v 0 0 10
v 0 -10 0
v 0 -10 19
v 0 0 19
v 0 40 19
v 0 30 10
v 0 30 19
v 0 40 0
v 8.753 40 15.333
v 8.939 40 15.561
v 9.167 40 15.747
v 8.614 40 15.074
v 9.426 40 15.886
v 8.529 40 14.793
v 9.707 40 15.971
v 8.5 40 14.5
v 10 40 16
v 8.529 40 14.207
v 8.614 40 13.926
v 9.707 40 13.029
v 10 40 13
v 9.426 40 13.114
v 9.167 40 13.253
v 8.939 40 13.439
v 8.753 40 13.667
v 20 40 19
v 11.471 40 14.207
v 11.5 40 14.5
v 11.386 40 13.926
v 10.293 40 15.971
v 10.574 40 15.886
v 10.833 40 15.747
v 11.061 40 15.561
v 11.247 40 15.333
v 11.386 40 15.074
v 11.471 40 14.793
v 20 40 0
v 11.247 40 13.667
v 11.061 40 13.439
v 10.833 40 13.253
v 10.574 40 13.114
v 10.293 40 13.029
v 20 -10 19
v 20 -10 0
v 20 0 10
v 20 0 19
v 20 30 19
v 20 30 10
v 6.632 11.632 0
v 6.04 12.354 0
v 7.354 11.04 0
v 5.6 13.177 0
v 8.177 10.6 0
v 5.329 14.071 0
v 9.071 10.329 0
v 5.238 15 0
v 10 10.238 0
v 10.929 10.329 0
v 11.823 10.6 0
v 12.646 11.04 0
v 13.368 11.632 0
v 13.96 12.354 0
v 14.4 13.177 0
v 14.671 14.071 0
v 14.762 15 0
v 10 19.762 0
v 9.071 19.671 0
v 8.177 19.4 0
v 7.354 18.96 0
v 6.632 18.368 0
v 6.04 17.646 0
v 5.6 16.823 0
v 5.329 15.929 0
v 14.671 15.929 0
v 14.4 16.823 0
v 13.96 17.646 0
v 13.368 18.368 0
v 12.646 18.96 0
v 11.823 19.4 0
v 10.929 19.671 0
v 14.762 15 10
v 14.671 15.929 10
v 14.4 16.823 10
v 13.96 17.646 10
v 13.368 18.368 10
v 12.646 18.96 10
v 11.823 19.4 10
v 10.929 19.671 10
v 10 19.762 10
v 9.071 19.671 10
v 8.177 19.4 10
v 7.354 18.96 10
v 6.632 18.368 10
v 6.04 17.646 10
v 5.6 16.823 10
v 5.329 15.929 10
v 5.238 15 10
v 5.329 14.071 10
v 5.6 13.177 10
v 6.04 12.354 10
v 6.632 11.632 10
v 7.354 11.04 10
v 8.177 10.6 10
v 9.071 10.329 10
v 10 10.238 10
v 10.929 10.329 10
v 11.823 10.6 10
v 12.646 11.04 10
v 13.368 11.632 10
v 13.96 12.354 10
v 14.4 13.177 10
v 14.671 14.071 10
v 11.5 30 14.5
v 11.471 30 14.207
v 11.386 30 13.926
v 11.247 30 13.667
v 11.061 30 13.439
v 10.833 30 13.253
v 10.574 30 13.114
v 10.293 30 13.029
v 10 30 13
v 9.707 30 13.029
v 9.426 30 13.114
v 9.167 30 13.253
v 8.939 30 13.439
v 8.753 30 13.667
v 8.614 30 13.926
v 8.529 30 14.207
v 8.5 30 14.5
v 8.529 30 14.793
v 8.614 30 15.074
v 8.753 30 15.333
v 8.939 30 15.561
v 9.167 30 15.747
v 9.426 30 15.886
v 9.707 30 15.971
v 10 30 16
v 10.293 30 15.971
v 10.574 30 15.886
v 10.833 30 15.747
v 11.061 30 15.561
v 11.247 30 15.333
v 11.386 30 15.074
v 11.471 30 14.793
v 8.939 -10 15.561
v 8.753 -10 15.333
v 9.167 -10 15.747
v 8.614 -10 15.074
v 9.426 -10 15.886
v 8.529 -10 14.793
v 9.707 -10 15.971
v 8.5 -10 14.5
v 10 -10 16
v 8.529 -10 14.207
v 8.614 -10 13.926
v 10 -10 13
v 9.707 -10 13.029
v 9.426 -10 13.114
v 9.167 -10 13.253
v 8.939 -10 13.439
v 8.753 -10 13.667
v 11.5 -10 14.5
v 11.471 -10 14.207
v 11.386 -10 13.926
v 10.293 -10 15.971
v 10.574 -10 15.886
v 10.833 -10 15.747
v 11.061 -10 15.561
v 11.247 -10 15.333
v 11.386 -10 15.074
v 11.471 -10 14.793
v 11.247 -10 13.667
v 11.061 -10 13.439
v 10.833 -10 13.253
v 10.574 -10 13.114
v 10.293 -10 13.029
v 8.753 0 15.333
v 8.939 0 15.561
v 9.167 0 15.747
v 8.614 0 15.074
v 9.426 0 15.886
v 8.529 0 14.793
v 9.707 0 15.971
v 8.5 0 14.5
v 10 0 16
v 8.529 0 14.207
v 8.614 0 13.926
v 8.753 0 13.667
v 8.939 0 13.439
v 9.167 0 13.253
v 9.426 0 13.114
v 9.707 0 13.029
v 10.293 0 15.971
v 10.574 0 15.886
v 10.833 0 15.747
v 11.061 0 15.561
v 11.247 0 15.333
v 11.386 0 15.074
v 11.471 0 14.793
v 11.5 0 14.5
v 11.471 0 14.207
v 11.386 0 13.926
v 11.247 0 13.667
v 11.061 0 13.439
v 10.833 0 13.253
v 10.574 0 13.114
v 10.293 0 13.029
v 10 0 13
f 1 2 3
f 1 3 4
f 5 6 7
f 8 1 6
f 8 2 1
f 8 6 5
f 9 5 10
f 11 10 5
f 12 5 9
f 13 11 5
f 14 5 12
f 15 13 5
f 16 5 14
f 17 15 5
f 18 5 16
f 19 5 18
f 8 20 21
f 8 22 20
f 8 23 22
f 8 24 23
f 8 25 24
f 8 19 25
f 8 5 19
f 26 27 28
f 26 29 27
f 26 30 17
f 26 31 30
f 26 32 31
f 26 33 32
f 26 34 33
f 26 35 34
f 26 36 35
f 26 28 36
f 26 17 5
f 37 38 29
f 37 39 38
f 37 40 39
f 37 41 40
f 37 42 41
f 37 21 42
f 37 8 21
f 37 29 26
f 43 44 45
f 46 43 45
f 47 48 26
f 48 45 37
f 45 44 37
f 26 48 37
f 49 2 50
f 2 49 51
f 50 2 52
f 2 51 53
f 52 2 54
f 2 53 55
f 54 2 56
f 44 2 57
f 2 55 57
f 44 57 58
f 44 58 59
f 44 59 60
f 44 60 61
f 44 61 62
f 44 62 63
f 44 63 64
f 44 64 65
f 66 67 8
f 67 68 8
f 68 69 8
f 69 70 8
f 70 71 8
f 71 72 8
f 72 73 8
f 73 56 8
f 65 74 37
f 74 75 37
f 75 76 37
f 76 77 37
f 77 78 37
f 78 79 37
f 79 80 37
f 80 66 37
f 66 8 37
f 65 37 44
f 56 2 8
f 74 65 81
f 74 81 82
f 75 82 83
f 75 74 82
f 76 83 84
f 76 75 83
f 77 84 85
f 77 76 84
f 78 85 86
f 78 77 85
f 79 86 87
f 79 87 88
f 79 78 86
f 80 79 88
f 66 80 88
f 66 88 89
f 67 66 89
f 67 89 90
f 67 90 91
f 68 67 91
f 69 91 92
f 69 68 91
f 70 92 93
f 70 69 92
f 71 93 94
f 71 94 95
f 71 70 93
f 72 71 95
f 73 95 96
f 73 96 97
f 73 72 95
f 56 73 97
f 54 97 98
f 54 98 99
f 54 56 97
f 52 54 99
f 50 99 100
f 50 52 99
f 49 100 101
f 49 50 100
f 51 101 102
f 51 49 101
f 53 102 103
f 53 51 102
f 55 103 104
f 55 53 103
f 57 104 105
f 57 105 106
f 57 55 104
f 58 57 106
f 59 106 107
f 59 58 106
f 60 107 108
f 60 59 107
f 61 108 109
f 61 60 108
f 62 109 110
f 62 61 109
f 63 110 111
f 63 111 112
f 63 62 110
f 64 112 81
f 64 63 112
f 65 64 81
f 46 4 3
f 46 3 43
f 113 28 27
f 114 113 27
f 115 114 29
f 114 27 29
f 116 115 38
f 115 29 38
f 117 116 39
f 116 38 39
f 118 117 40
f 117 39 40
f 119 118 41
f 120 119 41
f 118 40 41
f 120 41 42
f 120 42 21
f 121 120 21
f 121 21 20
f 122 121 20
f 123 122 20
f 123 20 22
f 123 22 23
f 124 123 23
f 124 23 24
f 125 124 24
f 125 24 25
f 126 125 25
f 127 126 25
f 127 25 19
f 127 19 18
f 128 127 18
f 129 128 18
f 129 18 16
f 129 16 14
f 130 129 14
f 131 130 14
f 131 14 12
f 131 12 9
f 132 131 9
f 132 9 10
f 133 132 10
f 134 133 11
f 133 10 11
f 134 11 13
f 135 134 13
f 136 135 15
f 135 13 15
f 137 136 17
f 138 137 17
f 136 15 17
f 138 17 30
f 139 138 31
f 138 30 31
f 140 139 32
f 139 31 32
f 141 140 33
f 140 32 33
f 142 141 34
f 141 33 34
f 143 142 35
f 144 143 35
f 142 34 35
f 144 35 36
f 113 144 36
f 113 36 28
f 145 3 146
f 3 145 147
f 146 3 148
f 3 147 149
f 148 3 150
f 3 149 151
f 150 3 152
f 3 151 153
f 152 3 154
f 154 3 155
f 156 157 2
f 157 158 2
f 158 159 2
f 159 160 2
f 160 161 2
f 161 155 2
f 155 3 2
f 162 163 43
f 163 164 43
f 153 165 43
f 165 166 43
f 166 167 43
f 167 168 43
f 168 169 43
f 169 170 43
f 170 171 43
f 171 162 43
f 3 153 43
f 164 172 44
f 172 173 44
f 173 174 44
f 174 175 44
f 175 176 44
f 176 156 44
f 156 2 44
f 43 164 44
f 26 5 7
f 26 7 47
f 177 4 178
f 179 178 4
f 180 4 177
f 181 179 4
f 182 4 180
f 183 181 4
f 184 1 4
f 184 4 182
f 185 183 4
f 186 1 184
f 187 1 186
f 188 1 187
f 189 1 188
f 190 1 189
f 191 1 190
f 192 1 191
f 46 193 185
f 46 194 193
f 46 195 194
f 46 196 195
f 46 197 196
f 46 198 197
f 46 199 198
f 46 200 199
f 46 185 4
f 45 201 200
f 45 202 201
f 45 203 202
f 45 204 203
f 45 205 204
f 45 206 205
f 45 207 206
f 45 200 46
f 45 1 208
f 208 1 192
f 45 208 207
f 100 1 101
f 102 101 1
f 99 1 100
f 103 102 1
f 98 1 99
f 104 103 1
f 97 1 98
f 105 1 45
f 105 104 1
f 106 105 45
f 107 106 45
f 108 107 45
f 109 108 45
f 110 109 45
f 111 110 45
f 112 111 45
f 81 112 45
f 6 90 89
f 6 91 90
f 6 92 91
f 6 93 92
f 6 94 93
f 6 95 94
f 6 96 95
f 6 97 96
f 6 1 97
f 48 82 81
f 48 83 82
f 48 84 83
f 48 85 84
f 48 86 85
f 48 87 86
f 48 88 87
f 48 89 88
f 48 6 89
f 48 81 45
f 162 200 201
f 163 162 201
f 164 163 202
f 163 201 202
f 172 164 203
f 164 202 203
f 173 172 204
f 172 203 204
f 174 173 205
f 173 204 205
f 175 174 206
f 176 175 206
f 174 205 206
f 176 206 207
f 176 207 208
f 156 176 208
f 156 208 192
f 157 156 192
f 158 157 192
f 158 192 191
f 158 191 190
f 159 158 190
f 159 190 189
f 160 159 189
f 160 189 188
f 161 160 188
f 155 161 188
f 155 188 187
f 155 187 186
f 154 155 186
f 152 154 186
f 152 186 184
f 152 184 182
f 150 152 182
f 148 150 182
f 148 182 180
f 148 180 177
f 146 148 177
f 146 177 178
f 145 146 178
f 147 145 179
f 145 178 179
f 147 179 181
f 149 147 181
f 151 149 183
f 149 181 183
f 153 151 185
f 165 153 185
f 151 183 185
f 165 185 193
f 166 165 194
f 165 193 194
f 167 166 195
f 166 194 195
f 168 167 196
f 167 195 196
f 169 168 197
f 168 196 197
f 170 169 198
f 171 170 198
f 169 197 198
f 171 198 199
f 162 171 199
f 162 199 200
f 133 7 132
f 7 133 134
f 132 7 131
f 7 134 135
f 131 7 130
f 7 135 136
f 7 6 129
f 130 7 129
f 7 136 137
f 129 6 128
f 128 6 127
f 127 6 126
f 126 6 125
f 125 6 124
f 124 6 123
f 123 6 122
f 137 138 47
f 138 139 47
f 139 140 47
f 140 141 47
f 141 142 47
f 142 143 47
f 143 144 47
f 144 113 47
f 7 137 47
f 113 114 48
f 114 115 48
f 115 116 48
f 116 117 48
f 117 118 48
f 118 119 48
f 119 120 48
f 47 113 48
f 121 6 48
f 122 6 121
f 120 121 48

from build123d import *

# Parameters (mm, degrees)
SKETCH1_W           = 20
SKETCH1_H           = 30
SKETCH1_R           = 4.7625
BOSS_EXTRUDE1_DEPTH = 10
SKETCH2_W           = 20
SKETCH2_H           = 10
BOSS_EXTRUDE2_DEPTH = 19
SKETCH3_R           = 1.5
CUT_EXTRUDE1_DEPTH  = 51


with BuildPart() as part:
    # Sketch1 → Boss-Extrude1 (new body)
    with BuildSketch(Plane.XY):
        with Locations((10, 15)):
            Rectangle(SKETCH1_W, SKETCH1_H)
        with Locations((10, 15)):
            Circle(SKETCH1_R, mode=Mode.SUBTRACT)
    extrude(amount=BOSS_EXTRUDE1_DEPTH)

    # Sketch2 → Boss-Extrude2 (add)
    with BuildSketch(Plane.XY):
        with Locations((10, -5)):
            Rectangle(SKETCH2_W, SKETCH2_H)
        with Locations((10, 35)):
            Rectangle(SKETCH2_W, SKETCH2_H)
    extrude(amount=BOSS_EXTRUDE2_DEPTH)

    # Sketch3 → Cut-Extrude1 (cut, through all)
    with BuildSketch(Plane(origin=(0, 40, 0), x_dir=(1, 0, 0), z_dir=(0, 1, 0))):
        with Locations((10, -14.5)):
            Circle(SKETCH3_R)
    extrude(amount=-CUT_EXTRUDE1_DEPTH, mode=Mode.SUBTRACT)


solid = part.part
